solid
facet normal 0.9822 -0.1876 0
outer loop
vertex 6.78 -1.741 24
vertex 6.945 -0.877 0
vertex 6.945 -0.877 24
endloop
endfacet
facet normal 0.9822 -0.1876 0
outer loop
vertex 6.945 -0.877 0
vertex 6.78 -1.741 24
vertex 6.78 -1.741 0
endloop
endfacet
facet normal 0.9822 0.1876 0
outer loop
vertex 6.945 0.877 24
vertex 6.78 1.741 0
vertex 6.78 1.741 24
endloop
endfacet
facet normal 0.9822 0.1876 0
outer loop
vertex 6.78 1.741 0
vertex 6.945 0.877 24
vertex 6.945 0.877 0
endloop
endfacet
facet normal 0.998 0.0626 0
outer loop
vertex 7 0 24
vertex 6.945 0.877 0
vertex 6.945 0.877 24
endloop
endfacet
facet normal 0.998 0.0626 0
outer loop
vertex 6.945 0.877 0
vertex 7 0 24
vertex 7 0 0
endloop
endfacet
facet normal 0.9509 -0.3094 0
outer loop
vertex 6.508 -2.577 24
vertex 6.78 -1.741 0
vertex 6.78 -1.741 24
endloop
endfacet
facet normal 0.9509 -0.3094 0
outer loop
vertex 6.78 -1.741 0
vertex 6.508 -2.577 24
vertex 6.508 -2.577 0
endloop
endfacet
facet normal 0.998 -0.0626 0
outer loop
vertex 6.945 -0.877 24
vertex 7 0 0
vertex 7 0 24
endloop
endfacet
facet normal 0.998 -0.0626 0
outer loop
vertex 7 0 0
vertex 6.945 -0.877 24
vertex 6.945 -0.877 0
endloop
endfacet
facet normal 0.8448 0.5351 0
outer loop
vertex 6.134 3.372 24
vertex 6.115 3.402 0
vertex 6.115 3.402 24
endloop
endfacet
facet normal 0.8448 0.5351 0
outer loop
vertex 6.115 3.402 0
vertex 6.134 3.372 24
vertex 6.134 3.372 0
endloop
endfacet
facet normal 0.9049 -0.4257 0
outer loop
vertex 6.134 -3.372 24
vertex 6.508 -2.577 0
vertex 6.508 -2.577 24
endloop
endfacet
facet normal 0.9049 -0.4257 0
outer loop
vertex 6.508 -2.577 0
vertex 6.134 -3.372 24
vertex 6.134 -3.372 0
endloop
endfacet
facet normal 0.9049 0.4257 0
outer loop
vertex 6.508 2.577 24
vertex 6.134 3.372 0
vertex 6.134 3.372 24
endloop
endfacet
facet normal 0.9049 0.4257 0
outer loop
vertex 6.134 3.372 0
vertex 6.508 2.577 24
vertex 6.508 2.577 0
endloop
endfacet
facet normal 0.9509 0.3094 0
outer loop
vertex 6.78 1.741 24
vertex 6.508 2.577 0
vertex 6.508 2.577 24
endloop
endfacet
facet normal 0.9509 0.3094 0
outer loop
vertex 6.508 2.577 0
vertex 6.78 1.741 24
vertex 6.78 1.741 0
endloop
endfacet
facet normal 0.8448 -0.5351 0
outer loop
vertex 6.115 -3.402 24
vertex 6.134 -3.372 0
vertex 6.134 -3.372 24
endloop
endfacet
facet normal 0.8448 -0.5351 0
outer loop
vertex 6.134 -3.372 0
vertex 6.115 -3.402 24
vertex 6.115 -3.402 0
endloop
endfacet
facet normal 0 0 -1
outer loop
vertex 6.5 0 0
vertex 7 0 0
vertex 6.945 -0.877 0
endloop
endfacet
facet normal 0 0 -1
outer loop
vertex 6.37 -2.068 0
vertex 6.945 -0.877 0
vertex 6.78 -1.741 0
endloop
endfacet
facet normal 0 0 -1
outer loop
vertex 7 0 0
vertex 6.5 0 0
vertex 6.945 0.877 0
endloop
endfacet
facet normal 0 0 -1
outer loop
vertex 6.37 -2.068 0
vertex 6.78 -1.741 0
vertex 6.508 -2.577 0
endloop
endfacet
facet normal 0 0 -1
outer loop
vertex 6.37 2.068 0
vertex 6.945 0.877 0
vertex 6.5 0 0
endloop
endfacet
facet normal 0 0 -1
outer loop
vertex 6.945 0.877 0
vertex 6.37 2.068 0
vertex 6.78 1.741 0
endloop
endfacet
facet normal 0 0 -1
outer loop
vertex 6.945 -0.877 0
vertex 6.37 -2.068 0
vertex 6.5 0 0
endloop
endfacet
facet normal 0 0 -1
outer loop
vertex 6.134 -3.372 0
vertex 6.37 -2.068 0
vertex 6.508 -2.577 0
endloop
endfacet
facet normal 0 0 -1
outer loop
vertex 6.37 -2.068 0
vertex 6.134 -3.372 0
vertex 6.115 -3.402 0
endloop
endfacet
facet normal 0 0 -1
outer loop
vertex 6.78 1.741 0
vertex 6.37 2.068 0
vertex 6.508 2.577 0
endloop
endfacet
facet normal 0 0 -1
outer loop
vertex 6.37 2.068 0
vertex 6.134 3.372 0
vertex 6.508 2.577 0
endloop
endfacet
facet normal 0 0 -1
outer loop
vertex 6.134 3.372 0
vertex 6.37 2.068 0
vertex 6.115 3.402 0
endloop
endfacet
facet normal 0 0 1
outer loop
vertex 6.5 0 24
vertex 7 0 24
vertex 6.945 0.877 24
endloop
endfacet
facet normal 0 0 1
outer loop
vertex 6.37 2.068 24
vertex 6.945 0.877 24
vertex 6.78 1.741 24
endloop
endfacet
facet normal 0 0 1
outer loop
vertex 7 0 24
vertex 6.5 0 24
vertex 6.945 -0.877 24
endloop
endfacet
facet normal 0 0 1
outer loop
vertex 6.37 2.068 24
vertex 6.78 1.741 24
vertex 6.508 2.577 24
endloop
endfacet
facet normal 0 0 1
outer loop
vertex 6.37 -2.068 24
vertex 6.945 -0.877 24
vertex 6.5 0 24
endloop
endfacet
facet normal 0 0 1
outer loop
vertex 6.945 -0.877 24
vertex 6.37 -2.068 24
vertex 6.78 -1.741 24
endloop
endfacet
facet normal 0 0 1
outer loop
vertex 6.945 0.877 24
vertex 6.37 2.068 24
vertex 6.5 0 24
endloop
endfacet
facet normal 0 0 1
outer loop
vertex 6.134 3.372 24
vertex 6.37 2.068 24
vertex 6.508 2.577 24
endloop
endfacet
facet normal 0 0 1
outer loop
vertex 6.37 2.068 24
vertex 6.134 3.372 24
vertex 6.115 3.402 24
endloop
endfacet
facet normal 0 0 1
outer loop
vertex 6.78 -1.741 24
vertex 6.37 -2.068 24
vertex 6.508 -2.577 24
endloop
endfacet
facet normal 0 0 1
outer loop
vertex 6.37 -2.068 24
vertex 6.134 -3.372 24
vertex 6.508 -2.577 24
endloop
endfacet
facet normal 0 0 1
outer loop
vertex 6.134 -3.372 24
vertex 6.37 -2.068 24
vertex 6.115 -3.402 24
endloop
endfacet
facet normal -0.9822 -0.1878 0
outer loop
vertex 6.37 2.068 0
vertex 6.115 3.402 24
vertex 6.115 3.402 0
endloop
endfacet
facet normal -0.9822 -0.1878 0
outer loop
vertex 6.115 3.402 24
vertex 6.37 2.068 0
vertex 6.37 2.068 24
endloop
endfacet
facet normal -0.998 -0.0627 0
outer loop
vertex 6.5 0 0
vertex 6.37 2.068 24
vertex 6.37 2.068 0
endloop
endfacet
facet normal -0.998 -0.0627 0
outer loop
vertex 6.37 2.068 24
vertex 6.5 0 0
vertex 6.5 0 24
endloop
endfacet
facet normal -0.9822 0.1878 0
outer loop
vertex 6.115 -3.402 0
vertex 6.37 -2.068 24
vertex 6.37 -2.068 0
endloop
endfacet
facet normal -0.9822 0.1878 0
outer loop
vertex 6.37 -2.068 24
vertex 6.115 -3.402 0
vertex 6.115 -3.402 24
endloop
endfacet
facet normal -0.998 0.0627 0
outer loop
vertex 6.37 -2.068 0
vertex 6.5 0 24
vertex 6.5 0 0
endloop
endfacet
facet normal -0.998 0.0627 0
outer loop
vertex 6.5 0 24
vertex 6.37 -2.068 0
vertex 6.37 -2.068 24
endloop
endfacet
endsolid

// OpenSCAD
$fn = 50;


difference() {
	union() {
		cylinder(h = 24, r = 7.0000000000);
		translate(v = [-13.0000000000, 0, 0]) {
			cylinder(h = 24, r = 7.0000000000);
		}
	}
	union() {
		cylinder(h = 24, r = 3.2500000000);
		cylinder(h = 24, r = 1.8000000000);
		cylinder(h = 24, r = 1.8000000000);
		cylinder(h = 24, r = 1.8000000000);
		translate(v = [-17.5000000000, 0, 0]) {
			hull() {
				translate(v = [-3.7500000000, 0.0000000000, 0]) {
					cylinder(h = 24, r = 10.5000000000);
				}
				translate(v = [3.7500000000, 0.0000000000, 0]) {
					cylinder(h = 24, r = 10.5000000000);
				}
				translate(v = [-3.7500000000, -0.0000000000, 0]) {
					cylinder(h = 24, r = 10.5000000000);
				}
				translate(v = [3.7500000000, -0.0000000000, 0]) {
					cylinder(h = 24, r = 10.5000000000);
				}
			}
		}
		translate(v = [-10.0000000000, 0, 0.0000000000]) {
			cylinder(h = 24, r = 16.5000000000);
		}
	}
}
